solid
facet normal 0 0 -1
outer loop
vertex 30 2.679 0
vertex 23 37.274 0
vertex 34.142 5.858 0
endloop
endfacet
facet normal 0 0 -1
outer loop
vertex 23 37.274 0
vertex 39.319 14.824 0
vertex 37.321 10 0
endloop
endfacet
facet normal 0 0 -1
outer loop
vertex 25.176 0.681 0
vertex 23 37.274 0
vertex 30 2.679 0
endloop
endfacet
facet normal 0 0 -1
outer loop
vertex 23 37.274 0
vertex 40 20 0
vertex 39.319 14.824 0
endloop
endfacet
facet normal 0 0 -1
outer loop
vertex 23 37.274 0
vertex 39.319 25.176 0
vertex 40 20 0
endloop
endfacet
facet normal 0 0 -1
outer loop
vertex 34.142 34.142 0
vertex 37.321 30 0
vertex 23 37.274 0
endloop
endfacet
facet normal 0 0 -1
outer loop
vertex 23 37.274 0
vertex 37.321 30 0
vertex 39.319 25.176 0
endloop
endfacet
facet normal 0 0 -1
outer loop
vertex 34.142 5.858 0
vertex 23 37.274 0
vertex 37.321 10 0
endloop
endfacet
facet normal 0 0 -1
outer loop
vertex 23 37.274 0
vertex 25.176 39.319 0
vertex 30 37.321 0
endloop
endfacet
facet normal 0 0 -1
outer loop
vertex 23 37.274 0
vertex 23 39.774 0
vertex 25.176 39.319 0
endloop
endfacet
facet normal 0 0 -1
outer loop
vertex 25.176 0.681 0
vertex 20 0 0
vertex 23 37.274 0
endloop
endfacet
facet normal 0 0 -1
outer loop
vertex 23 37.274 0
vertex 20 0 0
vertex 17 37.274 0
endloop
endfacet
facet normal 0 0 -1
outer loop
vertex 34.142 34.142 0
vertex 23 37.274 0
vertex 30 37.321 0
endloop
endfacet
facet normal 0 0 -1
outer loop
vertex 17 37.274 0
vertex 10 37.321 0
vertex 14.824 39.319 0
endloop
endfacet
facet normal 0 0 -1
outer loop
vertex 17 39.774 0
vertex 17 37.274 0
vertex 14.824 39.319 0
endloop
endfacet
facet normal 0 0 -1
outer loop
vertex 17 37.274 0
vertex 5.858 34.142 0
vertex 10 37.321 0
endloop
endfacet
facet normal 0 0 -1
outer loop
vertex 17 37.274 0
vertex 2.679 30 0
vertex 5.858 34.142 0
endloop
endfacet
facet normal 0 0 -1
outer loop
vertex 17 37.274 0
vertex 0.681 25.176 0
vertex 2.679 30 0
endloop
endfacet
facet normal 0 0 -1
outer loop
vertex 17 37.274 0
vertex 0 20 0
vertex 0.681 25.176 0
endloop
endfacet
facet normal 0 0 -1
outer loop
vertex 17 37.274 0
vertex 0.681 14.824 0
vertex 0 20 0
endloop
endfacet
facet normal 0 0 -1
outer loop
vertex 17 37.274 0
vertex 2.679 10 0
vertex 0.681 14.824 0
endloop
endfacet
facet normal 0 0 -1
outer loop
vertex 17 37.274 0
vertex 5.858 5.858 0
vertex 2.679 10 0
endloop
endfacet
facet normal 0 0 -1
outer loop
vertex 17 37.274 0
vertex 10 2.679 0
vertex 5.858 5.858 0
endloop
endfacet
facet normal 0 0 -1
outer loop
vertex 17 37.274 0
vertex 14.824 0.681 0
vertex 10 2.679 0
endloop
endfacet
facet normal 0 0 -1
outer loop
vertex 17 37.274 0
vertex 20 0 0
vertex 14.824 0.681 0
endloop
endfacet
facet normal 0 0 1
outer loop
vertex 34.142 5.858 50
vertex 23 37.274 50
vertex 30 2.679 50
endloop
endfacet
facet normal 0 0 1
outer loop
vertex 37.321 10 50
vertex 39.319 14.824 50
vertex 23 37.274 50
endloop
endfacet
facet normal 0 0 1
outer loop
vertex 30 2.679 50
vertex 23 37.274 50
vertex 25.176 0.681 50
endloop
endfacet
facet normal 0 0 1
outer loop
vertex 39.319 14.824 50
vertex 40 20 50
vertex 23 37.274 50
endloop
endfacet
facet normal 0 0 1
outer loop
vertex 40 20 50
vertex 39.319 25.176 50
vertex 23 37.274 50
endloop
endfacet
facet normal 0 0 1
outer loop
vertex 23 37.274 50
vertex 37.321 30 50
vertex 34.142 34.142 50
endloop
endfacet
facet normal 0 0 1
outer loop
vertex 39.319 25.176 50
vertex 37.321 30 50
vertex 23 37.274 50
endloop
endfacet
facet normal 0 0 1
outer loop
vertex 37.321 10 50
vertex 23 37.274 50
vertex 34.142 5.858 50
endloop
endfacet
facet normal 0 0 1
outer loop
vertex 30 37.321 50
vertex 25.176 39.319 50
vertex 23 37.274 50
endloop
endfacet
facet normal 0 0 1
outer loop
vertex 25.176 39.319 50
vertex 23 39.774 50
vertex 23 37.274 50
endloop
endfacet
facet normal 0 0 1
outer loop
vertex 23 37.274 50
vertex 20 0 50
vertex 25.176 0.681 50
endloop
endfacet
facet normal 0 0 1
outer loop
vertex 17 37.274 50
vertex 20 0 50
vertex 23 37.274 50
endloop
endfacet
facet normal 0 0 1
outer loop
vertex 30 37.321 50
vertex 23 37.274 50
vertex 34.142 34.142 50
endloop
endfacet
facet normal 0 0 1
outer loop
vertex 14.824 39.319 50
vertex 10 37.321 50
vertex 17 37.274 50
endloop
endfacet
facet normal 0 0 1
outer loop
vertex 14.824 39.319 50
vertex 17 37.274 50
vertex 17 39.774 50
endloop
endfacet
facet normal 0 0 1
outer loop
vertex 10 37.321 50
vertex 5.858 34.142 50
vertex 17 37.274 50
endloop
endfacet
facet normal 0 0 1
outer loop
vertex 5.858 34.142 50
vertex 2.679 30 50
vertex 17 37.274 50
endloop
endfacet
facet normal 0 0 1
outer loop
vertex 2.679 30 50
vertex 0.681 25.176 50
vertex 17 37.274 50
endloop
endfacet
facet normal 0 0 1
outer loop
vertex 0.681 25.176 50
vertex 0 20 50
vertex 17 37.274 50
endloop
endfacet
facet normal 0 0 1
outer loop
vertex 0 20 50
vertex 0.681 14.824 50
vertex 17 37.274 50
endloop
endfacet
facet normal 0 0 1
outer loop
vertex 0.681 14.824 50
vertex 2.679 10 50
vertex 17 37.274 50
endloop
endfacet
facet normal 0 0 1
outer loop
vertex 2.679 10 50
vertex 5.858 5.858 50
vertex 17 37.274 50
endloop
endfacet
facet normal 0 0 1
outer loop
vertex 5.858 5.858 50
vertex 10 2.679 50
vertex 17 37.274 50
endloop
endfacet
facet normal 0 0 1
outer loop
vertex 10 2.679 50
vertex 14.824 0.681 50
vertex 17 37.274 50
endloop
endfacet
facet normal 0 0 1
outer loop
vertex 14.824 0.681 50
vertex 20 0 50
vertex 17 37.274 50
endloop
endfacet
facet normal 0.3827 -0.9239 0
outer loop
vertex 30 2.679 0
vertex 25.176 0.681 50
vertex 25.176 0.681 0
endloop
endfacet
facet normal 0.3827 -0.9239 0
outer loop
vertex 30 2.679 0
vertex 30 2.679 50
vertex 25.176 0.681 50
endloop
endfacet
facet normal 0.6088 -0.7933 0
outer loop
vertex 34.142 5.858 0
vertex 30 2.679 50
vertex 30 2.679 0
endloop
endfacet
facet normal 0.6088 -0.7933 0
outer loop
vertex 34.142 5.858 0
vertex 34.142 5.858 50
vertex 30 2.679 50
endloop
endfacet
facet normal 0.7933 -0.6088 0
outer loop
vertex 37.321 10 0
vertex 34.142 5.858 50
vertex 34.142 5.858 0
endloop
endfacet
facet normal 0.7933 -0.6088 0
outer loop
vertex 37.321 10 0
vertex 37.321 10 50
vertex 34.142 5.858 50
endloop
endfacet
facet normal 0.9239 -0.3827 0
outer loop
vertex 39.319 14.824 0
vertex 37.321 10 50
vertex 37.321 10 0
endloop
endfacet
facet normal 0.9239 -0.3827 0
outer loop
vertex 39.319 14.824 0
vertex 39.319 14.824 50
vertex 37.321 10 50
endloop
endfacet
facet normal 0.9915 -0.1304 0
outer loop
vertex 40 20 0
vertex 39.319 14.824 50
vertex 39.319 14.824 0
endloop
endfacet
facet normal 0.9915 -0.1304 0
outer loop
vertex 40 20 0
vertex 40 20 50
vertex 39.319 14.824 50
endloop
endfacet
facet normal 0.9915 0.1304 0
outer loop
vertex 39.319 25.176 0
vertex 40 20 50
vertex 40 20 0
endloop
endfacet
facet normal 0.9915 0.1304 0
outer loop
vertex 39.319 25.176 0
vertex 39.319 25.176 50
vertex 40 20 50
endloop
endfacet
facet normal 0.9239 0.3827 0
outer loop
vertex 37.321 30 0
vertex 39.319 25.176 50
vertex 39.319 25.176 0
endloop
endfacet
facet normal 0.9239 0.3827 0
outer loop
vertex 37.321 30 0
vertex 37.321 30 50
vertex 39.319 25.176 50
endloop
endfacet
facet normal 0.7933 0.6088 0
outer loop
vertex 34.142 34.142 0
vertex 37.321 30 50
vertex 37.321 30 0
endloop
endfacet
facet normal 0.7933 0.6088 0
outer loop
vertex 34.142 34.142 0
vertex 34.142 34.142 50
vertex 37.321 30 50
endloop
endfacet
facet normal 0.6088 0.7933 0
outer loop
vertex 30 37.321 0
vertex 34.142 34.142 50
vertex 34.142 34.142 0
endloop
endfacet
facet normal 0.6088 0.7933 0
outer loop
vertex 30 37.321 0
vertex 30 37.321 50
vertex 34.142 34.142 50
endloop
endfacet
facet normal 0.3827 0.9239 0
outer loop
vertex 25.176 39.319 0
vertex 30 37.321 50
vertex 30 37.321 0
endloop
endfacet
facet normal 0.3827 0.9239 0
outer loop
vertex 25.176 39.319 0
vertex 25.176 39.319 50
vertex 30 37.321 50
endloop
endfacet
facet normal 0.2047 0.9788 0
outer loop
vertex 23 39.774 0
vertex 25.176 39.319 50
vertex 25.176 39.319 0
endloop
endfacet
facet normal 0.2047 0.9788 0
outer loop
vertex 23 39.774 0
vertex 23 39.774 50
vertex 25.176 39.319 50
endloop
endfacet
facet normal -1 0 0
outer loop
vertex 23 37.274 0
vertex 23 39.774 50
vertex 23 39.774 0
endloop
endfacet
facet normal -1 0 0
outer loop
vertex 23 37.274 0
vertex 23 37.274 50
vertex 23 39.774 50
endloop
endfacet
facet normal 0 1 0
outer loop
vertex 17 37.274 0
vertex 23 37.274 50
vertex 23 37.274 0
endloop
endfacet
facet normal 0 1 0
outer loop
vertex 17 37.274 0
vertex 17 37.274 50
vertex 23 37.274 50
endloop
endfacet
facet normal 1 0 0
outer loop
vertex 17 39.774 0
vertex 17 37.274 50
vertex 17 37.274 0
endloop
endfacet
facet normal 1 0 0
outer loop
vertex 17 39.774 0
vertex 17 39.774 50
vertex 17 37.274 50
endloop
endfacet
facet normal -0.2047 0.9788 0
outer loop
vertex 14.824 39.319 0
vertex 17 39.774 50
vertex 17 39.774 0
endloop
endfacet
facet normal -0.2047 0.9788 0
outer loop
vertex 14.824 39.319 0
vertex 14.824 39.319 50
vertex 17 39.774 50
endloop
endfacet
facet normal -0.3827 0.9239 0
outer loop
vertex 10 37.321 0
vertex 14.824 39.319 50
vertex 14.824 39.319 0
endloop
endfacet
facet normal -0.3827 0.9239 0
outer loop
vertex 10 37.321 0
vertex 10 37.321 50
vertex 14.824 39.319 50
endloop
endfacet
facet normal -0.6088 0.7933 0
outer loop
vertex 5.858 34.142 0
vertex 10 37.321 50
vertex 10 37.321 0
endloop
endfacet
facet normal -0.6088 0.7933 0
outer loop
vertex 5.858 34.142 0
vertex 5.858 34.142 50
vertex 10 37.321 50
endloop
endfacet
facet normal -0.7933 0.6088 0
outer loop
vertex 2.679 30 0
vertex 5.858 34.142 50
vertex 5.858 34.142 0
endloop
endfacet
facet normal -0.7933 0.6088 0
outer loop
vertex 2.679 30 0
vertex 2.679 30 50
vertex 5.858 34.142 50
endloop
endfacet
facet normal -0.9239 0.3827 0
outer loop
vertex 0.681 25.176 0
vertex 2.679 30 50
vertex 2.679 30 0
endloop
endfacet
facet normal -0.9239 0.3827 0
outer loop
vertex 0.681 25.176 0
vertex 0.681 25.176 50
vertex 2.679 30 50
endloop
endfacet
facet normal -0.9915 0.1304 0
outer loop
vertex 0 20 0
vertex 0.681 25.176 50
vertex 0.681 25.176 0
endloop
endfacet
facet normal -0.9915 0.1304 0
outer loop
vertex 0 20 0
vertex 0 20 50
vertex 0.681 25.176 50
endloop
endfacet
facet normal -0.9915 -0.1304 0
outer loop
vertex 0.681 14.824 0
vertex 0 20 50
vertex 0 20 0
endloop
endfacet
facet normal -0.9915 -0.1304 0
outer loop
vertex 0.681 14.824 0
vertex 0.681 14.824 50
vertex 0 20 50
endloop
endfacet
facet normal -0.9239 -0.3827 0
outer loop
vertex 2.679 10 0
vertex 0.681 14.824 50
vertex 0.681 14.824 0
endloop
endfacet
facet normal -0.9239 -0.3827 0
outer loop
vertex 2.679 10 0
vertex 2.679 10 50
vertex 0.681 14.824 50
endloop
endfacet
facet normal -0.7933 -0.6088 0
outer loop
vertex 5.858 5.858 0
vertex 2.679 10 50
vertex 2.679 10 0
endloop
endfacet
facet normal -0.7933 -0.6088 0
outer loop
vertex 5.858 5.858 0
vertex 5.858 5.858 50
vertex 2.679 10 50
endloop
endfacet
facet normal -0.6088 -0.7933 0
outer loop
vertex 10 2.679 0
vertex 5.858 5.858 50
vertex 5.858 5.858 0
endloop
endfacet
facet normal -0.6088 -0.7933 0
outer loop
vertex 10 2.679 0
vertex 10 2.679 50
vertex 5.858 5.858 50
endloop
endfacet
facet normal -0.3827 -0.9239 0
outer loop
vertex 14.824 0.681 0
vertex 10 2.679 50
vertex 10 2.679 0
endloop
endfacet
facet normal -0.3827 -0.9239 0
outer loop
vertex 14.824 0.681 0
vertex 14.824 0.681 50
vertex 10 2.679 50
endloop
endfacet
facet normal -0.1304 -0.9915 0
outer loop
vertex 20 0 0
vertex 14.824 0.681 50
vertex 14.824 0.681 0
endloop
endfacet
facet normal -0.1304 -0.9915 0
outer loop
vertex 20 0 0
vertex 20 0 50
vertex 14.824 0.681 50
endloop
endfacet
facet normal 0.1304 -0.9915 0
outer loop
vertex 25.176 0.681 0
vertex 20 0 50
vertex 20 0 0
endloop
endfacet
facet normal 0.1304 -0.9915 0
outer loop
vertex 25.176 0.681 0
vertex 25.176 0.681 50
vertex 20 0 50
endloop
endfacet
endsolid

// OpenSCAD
$fn = 32;

// ----------------------------------------------------------------------
// Keyway shaft: d40 shaft, key 6 x 2.5 mm
// ----------------------------------------------------------------------

// --- parameters (mm) ---
shaft_r = 20;             // shaft radius
key_w = 6;                // keyway width
key_d = 2.5;              // keyway depth below the surface line
plate_t = 50;             // shaft length, Z (extrusion height)

shaft_d = 2 * shaft_r;  // shaft diameter
circle_step = 15;  // polygon sampling step, degrees

profile = [[14.824, 39.319], [10, 37.321], [5.858, 34.142], [2.679, 30], [0.681, 25.176], [0, 20], [0.681, 14.824], [2.679, 10], [5.858, 5.858], [10, 2.679], [14.824, 0.681], [20, 0], [25.176, 0.681], [30, 2.679], [34.142, 5.858], [37.321, 10], [39.319, 14.824], [40, 20], [39.319, 25.176], [37.321, 30], [34.142, 34.142], [30, 37.321], [25.176, 39.319], [23, 39.774], [23, 37.274], [17, 37.274], [17, 39.774]];  // primary outline, 27 points, counter clockwise

// --- the one profile operation ---
linear_extrude(height = plate_t) polygon(points = profile);
